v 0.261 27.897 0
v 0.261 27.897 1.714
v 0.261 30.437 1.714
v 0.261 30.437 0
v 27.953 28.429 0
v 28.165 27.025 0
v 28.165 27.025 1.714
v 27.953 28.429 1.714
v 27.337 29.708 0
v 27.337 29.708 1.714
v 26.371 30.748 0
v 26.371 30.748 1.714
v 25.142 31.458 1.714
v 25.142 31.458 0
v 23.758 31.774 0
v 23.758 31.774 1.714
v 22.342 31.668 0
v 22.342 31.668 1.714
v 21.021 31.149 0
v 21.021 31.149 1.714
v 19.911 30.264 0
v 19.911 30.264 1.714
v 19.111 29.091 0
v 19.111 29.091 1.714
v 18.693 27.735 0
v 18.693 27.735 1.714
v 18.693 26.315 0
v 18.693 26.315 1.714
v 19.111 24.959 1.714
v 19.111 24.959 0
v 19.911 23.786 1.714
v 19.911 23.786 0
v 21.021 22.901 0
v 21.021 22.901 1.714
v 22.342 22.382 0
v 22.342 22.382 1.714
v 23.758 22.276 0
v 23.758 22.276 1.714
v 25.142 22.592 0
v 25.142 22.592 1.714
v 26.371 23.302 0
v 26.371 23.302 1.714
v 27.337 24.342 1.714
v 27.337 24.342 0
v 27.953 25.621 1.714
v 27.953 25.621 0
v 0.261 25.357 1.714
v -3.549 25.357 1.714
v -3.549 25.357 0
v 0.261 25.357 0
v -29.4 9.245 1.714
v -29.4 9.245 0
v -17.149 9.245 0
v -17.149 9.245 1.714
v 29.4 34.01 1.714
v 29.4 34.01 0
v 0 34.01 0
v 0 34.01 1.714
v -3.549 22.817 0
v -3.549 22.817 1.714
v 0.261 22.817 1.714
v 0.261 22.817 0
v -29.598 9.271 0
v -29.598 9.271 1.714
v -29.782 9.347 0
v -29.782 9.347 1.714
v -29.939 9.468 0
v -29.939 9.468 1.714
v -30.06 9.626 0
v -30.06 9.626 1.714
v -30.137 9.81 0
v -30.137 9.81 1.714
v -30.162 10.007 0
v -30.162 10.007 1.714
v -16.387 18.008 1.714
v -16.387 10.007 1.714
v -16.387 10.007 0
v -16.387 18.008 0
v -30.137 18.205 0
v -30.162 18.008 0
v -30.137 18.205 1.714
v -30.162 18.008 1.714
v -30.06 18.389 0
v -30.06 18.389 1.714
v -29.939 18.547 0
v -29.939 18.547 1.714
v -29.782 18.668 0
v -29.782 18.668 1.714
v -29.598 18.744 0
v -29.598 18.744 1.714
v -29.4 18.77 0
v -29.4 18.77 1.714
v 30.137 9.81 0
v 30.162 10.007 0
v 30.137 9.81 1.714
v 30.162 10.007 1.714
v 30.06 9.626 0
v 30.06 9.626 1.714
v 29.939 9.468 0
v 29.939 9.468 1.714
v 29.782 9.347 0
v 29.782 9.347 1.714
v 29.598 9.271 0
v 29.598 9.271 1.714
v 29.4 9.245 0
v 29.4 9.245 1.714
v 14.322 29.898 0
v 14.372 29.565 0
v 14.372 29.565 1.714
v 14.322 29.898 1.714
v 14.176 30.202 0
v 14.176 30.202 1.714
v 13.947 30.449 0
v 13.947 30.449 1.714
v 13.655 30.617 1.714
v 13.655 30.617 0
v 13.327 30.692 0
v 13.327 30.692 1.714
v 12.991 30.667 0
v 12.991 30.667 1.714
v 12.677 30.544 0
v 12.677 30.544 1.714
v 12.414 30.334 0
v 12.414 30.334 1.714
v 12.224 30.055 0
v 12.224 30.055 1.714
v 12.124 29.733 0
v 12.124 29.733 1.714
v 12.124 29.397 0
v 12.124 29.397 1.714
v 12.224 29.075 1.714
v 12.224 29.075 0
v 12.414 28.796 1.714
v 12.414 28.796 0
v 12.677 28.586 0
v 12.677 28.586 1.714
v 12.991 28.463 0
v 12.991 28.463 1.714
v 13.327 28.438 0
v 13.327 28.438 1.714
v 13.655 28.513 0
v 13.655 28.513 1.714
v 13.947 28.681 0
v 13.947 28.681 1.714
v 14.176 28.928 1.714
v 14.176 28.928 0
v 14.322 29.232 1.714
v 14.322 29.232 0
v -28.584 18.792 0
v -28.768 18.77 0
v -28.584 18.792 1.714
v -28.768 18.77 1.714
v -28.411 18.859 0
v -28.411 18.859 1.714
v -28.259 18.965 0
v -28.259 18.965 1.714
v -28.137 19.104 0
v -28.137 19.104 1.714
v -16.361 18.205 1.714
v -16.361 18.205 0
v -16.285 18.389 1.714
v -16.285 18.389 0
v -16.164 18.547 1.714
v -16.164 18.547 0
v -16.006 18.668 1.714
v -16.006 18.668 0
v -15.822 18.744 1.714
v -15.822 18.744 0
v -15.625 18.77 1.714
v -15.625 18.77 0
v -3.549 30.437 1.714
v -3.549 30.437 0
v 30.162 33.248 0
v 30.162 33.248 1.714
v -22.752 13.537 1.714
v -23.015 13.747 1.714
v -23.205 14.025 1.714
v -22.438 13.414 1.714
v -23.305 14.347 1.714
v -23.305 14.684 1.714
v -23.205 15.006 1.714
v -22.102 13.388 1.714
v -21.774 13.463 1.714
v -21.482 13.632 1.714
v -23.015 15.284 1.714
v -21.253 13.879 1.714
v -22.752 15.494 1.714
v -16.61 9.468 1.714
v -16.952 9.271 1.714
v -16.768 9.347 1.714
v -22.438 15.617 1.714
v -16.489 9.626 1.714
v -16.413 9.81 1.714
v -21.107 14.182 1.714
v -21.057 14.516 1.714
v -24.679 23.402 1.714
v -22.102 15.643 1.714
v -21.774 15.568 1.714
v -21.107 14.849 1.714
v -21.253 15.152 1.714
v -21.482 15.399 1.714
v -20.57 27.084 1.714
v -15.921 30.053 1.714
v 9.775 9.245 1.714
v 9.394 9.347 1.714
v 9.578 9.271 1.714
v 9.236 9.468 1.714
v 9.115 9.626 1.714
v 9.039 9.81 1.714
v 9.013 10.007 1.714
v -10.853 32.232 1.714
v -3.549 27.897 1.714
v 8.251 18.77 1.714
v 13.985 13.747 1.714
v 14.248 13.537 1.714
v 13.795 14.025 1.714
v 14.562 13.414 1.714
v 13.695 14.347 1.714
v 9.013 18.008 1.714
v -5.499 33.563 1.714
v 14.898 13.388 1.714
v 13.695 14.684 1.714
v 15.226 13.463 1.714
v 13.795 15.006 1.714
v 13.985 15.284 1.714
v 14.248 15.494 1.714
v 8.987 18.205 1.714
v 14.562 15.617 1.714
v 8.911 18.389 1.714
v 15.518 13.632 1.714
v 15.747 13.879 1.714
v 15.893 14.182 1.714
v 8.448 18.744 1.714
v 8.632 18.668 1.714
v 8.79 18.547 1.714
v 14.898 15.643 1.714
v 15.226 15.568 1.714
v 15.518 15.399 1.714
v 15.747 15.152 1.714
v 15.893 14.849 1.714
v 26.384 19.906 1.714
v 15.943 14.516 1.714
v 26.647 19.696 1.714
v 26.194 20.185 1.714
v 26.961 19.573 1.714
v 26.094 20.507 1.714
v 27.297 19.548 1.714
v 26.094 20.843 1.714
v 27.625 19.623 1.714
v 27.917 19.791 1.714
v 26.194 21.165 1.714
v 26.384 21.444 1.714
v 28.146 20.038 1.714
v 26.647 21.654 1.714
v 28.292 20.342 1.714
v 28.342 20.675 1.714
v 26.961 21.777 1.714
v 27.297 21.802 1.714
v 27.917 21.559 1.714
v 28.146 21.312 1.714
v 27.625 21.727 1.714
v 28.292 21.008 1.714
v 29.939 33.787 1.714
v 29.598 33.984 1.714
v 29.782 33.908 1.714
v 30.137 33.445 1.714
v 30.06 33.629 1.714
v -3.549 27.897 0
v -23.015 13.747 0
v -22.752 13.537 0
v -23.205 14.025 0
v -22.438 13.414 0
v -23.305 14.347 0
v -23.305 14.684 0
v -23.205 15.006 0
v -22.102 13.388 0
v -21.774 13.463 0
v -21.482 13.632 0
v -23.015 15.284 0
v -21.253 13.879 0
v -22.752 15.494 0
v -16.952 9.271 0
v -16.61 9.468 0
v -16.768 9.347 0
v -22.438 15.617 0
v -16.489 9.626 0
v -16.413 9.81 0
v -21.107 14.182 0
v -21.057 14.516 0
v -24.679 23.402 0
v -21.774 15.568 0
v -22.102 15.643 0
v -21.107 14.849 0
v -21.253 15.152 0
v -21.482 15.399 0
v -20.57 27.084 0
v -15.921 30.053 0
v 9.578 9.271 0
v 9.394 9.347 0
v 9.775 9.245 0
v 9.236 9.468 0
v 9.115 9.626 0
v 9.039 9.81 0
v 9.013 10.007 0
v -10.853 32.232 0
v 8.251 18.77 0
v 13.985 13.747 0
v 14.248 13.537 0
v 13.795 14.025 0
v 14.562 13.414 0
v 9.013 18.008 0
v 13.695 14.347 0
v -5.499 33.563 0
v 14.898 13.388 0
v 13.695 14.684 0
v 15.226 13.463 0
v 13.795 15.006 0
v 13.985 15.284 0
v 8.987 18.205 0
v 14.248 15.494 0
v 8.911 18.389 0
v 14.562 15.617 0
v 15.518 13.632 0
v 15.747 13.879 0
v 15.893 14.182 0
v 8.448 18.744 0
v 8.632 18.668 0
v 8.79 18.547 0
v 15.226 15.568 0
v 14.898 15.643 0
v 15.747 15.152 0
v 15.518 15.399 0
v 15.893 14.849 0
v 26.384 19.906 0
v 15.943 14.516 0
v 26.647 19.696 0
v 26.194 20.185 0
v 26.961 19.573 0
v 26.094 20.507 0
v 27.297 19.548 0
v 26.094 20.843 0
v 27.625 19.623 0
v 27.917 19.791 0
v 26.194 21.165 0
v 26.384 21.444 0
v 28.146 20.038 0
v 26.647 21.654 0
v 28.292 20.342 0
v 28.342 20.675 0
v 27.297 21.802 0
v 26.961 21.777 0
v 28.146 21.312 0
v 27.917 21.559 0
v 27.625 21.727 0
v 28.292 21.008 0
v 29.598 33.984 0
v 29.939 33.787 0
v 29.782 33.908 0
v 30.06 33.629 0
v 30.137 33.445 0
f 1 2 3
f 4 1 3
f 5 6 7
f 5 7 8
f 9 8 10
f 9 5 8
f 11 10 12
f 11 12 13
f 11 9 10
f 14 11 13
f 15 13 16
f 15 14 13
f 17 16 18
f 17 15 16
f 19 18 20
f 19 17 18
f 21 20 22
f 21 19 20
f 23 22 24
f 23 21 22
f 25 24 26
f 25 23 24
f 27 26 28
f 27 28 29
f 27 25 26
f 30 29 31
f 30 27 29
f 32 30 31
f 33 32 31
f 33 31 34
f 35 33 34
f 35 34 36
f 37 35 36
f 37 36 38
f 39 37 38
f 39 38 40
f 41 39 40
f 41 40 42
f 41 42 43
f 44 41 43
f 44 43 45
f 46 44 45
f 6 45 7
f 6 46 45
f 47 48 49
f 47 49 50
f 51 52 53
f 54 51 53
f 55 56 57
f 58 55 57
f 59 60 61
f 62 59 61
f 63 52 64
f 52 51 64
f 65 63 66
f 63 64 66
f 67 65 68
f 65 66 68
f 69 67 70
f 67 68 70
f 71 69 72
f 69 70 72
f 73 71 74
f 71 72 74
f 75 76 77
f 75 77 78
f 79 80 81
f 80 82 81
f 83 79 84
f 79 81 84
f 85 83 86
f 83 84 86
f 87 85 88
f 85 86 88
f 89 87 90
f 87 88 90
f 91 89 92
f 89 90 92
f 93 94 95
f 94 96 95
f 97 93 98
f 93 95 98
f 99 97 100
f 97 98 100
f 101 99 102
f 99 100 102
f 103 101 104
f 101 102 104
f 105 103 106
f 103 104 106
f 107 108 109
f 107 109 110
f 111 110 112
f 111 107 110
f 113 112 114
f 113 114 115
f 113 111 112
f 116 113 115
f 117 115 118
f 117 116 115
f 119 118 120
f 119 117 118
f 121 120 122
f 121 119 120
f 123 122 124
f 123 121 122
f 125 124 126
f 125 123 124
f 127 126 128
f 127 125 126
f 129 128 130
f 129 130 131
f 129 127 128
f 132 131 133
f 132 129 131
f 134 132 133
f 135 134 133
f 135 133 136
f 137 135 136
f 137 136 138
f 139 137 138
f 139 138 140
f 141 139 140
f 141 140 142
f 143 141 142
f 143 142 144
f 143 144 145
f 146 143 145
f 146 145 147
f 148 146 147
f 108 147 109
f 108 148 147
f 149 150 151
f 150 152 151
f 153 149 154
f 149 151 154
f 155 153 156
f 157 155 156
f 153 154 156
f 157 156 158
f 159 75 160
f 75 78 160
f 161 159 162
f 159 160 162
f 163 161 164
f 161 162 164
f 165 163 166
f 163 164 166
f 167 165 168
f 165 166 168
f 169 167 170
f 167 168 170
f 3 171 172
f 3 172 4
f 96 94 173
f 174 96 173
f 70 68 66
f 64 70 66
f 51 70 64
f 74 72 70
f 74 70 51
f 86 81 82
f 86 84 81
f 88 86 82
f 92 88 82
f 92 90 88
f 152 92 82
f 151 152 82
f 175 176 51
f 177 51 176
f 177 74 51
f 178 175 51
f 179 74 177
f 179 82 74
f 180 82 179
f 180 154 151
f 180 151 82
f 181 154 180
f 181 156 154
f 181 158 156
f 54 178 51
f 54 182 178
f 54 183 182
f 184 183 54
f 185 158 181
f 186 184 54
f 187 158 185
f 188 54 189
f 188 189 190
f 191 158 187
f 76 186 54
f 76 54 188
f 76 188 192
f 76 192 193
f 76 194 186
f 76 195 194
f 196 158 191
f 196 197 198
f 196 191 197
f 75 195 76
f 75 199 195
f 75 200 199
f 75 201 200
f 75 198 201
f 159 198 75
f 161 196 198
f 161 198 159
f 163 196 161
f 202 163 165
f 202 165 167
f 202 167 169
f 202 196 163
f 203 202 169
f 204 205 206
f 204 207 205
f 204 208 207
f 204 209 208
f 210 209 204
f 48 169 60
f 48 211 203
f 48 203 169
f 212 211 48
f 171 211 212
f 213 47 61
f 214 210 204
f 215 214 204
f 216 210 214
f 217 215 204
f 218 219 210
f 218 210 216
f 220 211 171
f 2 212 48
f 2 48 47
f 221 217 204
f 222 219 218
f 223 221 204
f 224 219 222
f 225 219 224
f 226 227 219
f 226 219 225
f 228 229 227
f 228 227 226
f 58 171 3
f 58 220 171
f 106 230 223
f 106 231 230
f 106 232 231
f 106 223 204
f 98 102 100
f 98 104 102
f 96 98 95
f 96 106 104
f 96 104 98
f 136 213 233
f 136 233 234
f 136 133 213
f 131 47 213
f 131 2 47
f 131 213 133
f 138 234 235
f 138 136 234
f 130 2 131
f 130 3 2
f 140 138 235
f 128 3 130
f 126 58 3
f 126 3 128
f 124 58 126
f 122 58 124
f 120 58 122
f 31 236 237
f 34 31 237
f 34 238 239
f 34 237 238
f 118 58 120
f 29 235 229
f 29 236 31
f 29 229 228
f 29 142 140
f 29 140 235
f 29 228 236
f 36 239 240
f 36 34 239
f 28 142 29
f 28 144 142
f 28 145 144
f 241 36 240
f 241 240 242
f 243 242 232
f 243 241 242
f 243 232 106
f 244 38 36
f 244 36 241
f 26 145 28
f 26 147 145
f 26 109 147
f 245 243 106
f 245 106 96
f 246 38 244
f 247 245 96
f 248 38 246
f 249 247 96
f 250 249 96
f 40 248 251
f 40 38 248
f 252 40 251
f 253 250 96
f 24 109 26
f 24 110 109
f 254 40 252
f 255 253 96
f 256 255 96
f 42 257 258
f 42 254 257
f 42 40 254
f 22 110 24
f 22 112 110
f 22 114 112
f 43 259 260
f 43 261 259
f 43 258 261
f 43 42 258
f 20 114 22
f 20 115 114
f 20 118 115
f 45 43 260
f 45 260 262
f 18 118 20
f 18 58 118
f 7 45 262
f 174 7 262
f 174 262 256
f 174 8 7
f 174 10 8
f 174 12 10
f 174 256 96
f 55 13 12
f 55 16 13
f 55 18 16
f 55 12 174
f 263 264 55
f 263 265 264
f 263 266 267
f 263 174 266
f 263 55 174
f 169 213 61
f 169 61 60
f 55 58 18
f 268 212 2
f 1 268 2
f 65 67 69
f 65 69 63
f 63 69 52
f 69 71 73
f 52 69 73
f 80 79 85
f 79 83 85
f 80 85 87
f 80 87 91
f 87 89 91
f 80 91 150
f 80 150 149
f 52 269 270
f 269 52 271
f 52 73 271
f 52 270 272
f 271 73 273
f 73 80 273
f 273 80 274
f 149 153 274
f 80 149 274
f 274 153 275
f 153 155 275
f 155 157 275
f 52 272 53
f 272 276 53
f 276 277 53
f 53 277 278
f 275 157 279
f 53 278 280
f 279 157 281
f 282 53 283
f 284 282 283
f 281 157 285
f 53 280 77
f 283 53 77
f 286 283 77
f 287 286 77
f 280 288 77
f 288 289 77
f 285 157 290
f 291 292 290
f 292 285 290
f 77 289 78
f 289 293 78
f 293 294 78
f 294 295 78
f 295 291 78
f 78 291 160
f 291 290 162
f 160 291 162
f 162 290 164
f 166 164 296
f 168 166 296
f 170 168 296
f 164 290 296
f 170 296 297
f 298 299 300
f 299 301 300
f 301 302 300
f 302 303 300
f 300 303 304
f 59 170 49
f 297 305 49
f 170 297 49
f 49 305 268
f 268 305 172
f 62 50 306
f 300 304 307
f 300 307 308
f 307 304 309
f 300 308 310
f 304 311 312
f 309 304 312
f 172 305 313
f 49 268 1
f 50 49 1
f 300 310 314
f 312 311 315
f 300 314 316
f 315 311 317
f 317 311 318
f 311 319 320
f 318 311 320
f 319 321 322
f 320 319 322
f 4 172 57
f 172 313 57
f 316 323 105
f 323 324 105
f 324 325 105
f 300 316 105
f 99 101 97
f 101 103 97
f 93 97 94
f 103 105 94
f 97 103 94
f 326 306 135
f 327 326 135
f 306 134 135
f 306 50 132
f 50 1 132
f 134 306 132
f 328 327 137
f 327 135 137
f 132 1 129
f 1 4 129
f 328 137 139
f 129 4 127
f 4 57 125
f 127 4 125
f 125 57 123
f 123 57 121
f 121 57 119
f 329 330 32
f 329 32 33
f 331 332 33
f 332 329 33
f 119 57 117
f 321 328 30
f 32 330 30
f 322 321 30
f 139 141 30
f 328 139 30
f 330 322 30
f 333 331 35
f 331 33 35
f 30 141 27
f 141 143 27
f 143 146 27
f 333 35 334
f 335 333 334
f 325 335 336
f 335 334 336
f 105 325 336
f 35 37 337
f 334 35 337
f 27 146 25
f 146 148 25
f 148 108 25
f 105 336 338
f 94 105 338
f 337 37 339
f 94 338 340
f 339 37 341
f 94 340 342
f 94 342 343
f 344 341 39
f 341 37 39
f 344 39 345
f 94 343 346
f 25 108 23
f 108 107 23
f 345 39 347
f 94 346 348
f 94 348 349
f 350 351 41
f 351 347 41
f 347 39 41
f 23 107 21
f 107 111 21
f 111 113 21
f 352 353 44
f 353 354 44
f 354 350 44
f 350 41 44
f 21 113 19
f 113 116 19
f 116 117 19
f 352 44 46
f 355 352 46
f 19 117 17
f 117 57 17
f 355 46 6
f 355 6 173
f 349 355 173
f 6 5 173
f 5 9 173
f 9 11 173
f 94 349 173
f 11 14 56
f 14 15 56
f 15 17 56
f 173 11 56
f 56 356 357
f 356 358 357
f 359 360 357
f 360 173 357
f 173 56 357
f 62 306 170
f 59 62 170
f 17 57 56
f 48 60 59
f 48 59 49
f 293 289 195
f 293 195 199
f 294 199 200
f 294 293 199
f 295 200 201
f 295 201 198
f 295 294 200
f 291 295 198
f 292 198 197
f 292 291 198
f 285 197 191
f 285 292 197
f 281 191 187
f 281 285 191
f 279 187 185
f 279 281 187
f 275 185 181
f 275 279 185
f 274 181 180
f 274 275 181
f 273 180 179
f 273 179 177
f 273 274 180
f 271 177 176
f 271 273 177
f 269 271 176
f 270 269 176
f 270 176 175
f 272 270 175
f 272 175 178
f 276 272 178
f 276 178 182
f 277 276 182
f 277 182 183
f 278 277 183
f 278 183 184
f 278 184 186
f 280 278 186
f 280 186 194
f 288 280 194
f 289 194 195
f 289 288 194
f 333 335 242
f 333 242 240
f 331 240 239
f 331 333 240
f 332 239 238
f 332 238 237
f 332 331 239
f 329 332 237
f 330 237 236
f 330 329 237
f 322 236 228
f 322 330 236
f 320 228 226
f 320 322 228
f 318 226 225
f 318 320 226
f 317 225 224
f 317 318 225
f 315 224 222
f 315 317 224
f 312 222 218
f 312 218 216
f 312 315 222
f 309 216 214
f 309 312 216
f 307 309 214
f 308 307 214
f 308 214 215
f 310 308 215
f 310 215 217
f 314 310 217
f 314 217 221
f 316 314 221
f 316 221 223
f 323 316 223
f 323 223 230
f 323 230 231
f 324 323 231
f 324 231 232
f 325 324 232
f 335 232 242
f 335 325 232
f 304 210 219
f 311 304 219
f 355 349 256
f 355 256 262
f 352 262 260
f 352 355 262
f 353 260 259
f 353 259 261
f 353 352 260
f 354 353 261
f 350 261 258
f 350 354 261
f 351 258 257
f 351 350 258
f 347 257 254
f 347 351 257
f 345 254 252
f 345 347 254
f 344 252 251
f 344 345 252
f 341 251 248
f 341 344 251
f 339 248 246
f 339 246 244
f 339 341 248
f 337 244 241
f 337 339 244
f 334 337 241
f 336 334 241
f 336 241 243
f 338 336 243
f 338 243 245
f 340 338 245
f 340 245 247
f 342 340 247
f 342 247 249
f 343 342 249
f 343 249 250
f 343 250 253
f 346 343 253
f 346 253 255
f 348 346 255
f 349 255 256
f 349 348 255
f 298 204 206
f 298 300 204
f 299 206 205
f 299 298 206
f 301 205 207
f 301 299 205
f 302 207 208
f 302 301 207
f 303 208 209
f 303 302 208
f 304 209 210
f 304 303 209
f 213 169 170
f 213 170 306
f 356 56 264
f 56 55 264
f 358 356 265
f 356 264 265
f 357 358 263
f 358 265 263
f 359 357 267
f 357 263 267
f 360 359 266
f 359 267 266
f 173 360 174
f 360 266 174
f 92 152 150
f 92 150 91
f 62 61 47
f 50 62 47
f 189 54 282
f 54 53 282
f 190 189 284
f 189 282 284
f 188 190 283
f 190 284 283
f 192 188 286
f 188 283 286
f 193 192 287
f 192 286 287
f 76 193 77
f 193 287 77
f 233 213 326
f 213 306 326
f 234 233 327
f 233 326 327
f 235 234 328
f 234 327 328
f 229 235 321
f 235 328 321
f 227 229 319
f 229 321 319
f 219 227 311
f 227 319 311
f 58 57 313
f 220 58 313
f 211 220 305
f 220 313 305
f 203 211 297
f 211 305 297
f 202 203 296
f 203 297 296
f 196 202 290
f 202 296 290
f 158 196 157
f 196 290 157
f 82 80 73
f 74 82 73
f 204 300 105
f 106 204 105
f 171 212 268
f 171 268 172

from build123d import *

# Parameters (mm, degrees)
SKETCH1_R           = 4.7625
SKETCH1_R_2         = 1.1303
BOSS_EXTRUDE1_DEPTH = 1.7145
SKETCH2_W           = 3.81
SKETCH2_H           = 2.54
CUT_EXTRUDE1_DEPTH  = 1.7145
SKETCH3_W           = 25.4
SKETCH3_H           = 9.525
CUT_EXTRUDE2_DEPTH  = 1.7145
FILLET1_R           = 0.762
FILLET2_R           = 0.762


with BuildPart() as part:
    # Sketch1 → Boss-Extrude1 (new body)
    with BuildSketch(Plane.XY):
        with BuildLine():
            Line((-30.1625, 9.245), (30.1625, 9.245))
            Line((30.1625, 9.245), (30.1625, 34.01))
            Line((30.1625, 34.01), (0, 34.01))
            ThreePointArc((0, 34.01), (-16.098329106, 29.958703243), (-28.361368091, 18.77))
            Line((-28.361368091, 18.77), (-30.1625, 18.77))
            Line((-30.1625, 18.77), (-30.1625, 9.245))
        make_face()
        with Locations((23.402088835, 27.025)):
            Circle(SKETCH1_R, mode=Mode.SUBTRACT)
        with Locations((-22.1869, 14.5155)):
            Circle(SKETCH1_R_2, mode=Mode.SUBTRACT)
        with Locations((14.813099914, 14.5155)):
            Circle(SKETCH1_R_2, mode=Mode.SUBTRACT)
        with Locations((27.212088835, 20.675)):
            Circle(SKETCH1_R_2, mode=Mode.SUBTRACT)
        with Locations((13.242088835, 29.565)):
            Circle(SKETCH1_R_2, mode=Mode.SUBTRACT)
    extrude(amount=BOSS_EXTRUDE1_DEPTH)

    # Sketch2 → Cut-Extrude1 (cut)
    with BuildSketch(Plane.XY.offset(1.7145)):
        with Locations((-1.644140797, 29.166672544)):
            Rectangle(SKETCH2_W, SKETCH2_H)
        with Locations((-1.644140797, 24.086672544)):
            Rectangle(SKETCH2_W, SKETCH2_H)
    extrude(amount=-CUT_EXTRUDE1_DEPTH, mode=Mode.SUBTRACT)

    # Sketch3 → Cut-Extrude2 (cut)
    with BuildSketch(Plane.XY.offset(1.7145)):
        with Locations((-3.686900043, 14.0075)):
            Rectangle(SKETCH3_W, SKETCH3_H)
    extrude(amount=-CUT_EXTRUDE2_DEPTH, mode=Mode.SUBTRACT)

    # Fillet1
    fillet1_edges = [part.edges().sort_by_distance(p)[0] for p in [
        (-28.361368091, 18.77, 0.85725),
        (30.1625, 34.01, 0.85725),
        (30.1625, 9.245, 0.85725),
        (-30.1625, 9.245, 0.85725),
        (-30.1625, 18.77, 0.85725),
        (-16.386900043, 9.245, 0.85725),
        (9.013099957, 9.245, 0.85725),
    ]]
    fillet(fillet1_edges, radius=FILLET1_R)

    # Fillet2
    fillet2_edges = [part.edges().sort_by_distance(p)[0] for p in [
        (-16.386900043, 18.77, 0.85725),
        (9.013099957, 18.77, 0.85725),
    ]]
    fillet(fillet2_edges, radius=FILLET2_R)


solid = part.part
